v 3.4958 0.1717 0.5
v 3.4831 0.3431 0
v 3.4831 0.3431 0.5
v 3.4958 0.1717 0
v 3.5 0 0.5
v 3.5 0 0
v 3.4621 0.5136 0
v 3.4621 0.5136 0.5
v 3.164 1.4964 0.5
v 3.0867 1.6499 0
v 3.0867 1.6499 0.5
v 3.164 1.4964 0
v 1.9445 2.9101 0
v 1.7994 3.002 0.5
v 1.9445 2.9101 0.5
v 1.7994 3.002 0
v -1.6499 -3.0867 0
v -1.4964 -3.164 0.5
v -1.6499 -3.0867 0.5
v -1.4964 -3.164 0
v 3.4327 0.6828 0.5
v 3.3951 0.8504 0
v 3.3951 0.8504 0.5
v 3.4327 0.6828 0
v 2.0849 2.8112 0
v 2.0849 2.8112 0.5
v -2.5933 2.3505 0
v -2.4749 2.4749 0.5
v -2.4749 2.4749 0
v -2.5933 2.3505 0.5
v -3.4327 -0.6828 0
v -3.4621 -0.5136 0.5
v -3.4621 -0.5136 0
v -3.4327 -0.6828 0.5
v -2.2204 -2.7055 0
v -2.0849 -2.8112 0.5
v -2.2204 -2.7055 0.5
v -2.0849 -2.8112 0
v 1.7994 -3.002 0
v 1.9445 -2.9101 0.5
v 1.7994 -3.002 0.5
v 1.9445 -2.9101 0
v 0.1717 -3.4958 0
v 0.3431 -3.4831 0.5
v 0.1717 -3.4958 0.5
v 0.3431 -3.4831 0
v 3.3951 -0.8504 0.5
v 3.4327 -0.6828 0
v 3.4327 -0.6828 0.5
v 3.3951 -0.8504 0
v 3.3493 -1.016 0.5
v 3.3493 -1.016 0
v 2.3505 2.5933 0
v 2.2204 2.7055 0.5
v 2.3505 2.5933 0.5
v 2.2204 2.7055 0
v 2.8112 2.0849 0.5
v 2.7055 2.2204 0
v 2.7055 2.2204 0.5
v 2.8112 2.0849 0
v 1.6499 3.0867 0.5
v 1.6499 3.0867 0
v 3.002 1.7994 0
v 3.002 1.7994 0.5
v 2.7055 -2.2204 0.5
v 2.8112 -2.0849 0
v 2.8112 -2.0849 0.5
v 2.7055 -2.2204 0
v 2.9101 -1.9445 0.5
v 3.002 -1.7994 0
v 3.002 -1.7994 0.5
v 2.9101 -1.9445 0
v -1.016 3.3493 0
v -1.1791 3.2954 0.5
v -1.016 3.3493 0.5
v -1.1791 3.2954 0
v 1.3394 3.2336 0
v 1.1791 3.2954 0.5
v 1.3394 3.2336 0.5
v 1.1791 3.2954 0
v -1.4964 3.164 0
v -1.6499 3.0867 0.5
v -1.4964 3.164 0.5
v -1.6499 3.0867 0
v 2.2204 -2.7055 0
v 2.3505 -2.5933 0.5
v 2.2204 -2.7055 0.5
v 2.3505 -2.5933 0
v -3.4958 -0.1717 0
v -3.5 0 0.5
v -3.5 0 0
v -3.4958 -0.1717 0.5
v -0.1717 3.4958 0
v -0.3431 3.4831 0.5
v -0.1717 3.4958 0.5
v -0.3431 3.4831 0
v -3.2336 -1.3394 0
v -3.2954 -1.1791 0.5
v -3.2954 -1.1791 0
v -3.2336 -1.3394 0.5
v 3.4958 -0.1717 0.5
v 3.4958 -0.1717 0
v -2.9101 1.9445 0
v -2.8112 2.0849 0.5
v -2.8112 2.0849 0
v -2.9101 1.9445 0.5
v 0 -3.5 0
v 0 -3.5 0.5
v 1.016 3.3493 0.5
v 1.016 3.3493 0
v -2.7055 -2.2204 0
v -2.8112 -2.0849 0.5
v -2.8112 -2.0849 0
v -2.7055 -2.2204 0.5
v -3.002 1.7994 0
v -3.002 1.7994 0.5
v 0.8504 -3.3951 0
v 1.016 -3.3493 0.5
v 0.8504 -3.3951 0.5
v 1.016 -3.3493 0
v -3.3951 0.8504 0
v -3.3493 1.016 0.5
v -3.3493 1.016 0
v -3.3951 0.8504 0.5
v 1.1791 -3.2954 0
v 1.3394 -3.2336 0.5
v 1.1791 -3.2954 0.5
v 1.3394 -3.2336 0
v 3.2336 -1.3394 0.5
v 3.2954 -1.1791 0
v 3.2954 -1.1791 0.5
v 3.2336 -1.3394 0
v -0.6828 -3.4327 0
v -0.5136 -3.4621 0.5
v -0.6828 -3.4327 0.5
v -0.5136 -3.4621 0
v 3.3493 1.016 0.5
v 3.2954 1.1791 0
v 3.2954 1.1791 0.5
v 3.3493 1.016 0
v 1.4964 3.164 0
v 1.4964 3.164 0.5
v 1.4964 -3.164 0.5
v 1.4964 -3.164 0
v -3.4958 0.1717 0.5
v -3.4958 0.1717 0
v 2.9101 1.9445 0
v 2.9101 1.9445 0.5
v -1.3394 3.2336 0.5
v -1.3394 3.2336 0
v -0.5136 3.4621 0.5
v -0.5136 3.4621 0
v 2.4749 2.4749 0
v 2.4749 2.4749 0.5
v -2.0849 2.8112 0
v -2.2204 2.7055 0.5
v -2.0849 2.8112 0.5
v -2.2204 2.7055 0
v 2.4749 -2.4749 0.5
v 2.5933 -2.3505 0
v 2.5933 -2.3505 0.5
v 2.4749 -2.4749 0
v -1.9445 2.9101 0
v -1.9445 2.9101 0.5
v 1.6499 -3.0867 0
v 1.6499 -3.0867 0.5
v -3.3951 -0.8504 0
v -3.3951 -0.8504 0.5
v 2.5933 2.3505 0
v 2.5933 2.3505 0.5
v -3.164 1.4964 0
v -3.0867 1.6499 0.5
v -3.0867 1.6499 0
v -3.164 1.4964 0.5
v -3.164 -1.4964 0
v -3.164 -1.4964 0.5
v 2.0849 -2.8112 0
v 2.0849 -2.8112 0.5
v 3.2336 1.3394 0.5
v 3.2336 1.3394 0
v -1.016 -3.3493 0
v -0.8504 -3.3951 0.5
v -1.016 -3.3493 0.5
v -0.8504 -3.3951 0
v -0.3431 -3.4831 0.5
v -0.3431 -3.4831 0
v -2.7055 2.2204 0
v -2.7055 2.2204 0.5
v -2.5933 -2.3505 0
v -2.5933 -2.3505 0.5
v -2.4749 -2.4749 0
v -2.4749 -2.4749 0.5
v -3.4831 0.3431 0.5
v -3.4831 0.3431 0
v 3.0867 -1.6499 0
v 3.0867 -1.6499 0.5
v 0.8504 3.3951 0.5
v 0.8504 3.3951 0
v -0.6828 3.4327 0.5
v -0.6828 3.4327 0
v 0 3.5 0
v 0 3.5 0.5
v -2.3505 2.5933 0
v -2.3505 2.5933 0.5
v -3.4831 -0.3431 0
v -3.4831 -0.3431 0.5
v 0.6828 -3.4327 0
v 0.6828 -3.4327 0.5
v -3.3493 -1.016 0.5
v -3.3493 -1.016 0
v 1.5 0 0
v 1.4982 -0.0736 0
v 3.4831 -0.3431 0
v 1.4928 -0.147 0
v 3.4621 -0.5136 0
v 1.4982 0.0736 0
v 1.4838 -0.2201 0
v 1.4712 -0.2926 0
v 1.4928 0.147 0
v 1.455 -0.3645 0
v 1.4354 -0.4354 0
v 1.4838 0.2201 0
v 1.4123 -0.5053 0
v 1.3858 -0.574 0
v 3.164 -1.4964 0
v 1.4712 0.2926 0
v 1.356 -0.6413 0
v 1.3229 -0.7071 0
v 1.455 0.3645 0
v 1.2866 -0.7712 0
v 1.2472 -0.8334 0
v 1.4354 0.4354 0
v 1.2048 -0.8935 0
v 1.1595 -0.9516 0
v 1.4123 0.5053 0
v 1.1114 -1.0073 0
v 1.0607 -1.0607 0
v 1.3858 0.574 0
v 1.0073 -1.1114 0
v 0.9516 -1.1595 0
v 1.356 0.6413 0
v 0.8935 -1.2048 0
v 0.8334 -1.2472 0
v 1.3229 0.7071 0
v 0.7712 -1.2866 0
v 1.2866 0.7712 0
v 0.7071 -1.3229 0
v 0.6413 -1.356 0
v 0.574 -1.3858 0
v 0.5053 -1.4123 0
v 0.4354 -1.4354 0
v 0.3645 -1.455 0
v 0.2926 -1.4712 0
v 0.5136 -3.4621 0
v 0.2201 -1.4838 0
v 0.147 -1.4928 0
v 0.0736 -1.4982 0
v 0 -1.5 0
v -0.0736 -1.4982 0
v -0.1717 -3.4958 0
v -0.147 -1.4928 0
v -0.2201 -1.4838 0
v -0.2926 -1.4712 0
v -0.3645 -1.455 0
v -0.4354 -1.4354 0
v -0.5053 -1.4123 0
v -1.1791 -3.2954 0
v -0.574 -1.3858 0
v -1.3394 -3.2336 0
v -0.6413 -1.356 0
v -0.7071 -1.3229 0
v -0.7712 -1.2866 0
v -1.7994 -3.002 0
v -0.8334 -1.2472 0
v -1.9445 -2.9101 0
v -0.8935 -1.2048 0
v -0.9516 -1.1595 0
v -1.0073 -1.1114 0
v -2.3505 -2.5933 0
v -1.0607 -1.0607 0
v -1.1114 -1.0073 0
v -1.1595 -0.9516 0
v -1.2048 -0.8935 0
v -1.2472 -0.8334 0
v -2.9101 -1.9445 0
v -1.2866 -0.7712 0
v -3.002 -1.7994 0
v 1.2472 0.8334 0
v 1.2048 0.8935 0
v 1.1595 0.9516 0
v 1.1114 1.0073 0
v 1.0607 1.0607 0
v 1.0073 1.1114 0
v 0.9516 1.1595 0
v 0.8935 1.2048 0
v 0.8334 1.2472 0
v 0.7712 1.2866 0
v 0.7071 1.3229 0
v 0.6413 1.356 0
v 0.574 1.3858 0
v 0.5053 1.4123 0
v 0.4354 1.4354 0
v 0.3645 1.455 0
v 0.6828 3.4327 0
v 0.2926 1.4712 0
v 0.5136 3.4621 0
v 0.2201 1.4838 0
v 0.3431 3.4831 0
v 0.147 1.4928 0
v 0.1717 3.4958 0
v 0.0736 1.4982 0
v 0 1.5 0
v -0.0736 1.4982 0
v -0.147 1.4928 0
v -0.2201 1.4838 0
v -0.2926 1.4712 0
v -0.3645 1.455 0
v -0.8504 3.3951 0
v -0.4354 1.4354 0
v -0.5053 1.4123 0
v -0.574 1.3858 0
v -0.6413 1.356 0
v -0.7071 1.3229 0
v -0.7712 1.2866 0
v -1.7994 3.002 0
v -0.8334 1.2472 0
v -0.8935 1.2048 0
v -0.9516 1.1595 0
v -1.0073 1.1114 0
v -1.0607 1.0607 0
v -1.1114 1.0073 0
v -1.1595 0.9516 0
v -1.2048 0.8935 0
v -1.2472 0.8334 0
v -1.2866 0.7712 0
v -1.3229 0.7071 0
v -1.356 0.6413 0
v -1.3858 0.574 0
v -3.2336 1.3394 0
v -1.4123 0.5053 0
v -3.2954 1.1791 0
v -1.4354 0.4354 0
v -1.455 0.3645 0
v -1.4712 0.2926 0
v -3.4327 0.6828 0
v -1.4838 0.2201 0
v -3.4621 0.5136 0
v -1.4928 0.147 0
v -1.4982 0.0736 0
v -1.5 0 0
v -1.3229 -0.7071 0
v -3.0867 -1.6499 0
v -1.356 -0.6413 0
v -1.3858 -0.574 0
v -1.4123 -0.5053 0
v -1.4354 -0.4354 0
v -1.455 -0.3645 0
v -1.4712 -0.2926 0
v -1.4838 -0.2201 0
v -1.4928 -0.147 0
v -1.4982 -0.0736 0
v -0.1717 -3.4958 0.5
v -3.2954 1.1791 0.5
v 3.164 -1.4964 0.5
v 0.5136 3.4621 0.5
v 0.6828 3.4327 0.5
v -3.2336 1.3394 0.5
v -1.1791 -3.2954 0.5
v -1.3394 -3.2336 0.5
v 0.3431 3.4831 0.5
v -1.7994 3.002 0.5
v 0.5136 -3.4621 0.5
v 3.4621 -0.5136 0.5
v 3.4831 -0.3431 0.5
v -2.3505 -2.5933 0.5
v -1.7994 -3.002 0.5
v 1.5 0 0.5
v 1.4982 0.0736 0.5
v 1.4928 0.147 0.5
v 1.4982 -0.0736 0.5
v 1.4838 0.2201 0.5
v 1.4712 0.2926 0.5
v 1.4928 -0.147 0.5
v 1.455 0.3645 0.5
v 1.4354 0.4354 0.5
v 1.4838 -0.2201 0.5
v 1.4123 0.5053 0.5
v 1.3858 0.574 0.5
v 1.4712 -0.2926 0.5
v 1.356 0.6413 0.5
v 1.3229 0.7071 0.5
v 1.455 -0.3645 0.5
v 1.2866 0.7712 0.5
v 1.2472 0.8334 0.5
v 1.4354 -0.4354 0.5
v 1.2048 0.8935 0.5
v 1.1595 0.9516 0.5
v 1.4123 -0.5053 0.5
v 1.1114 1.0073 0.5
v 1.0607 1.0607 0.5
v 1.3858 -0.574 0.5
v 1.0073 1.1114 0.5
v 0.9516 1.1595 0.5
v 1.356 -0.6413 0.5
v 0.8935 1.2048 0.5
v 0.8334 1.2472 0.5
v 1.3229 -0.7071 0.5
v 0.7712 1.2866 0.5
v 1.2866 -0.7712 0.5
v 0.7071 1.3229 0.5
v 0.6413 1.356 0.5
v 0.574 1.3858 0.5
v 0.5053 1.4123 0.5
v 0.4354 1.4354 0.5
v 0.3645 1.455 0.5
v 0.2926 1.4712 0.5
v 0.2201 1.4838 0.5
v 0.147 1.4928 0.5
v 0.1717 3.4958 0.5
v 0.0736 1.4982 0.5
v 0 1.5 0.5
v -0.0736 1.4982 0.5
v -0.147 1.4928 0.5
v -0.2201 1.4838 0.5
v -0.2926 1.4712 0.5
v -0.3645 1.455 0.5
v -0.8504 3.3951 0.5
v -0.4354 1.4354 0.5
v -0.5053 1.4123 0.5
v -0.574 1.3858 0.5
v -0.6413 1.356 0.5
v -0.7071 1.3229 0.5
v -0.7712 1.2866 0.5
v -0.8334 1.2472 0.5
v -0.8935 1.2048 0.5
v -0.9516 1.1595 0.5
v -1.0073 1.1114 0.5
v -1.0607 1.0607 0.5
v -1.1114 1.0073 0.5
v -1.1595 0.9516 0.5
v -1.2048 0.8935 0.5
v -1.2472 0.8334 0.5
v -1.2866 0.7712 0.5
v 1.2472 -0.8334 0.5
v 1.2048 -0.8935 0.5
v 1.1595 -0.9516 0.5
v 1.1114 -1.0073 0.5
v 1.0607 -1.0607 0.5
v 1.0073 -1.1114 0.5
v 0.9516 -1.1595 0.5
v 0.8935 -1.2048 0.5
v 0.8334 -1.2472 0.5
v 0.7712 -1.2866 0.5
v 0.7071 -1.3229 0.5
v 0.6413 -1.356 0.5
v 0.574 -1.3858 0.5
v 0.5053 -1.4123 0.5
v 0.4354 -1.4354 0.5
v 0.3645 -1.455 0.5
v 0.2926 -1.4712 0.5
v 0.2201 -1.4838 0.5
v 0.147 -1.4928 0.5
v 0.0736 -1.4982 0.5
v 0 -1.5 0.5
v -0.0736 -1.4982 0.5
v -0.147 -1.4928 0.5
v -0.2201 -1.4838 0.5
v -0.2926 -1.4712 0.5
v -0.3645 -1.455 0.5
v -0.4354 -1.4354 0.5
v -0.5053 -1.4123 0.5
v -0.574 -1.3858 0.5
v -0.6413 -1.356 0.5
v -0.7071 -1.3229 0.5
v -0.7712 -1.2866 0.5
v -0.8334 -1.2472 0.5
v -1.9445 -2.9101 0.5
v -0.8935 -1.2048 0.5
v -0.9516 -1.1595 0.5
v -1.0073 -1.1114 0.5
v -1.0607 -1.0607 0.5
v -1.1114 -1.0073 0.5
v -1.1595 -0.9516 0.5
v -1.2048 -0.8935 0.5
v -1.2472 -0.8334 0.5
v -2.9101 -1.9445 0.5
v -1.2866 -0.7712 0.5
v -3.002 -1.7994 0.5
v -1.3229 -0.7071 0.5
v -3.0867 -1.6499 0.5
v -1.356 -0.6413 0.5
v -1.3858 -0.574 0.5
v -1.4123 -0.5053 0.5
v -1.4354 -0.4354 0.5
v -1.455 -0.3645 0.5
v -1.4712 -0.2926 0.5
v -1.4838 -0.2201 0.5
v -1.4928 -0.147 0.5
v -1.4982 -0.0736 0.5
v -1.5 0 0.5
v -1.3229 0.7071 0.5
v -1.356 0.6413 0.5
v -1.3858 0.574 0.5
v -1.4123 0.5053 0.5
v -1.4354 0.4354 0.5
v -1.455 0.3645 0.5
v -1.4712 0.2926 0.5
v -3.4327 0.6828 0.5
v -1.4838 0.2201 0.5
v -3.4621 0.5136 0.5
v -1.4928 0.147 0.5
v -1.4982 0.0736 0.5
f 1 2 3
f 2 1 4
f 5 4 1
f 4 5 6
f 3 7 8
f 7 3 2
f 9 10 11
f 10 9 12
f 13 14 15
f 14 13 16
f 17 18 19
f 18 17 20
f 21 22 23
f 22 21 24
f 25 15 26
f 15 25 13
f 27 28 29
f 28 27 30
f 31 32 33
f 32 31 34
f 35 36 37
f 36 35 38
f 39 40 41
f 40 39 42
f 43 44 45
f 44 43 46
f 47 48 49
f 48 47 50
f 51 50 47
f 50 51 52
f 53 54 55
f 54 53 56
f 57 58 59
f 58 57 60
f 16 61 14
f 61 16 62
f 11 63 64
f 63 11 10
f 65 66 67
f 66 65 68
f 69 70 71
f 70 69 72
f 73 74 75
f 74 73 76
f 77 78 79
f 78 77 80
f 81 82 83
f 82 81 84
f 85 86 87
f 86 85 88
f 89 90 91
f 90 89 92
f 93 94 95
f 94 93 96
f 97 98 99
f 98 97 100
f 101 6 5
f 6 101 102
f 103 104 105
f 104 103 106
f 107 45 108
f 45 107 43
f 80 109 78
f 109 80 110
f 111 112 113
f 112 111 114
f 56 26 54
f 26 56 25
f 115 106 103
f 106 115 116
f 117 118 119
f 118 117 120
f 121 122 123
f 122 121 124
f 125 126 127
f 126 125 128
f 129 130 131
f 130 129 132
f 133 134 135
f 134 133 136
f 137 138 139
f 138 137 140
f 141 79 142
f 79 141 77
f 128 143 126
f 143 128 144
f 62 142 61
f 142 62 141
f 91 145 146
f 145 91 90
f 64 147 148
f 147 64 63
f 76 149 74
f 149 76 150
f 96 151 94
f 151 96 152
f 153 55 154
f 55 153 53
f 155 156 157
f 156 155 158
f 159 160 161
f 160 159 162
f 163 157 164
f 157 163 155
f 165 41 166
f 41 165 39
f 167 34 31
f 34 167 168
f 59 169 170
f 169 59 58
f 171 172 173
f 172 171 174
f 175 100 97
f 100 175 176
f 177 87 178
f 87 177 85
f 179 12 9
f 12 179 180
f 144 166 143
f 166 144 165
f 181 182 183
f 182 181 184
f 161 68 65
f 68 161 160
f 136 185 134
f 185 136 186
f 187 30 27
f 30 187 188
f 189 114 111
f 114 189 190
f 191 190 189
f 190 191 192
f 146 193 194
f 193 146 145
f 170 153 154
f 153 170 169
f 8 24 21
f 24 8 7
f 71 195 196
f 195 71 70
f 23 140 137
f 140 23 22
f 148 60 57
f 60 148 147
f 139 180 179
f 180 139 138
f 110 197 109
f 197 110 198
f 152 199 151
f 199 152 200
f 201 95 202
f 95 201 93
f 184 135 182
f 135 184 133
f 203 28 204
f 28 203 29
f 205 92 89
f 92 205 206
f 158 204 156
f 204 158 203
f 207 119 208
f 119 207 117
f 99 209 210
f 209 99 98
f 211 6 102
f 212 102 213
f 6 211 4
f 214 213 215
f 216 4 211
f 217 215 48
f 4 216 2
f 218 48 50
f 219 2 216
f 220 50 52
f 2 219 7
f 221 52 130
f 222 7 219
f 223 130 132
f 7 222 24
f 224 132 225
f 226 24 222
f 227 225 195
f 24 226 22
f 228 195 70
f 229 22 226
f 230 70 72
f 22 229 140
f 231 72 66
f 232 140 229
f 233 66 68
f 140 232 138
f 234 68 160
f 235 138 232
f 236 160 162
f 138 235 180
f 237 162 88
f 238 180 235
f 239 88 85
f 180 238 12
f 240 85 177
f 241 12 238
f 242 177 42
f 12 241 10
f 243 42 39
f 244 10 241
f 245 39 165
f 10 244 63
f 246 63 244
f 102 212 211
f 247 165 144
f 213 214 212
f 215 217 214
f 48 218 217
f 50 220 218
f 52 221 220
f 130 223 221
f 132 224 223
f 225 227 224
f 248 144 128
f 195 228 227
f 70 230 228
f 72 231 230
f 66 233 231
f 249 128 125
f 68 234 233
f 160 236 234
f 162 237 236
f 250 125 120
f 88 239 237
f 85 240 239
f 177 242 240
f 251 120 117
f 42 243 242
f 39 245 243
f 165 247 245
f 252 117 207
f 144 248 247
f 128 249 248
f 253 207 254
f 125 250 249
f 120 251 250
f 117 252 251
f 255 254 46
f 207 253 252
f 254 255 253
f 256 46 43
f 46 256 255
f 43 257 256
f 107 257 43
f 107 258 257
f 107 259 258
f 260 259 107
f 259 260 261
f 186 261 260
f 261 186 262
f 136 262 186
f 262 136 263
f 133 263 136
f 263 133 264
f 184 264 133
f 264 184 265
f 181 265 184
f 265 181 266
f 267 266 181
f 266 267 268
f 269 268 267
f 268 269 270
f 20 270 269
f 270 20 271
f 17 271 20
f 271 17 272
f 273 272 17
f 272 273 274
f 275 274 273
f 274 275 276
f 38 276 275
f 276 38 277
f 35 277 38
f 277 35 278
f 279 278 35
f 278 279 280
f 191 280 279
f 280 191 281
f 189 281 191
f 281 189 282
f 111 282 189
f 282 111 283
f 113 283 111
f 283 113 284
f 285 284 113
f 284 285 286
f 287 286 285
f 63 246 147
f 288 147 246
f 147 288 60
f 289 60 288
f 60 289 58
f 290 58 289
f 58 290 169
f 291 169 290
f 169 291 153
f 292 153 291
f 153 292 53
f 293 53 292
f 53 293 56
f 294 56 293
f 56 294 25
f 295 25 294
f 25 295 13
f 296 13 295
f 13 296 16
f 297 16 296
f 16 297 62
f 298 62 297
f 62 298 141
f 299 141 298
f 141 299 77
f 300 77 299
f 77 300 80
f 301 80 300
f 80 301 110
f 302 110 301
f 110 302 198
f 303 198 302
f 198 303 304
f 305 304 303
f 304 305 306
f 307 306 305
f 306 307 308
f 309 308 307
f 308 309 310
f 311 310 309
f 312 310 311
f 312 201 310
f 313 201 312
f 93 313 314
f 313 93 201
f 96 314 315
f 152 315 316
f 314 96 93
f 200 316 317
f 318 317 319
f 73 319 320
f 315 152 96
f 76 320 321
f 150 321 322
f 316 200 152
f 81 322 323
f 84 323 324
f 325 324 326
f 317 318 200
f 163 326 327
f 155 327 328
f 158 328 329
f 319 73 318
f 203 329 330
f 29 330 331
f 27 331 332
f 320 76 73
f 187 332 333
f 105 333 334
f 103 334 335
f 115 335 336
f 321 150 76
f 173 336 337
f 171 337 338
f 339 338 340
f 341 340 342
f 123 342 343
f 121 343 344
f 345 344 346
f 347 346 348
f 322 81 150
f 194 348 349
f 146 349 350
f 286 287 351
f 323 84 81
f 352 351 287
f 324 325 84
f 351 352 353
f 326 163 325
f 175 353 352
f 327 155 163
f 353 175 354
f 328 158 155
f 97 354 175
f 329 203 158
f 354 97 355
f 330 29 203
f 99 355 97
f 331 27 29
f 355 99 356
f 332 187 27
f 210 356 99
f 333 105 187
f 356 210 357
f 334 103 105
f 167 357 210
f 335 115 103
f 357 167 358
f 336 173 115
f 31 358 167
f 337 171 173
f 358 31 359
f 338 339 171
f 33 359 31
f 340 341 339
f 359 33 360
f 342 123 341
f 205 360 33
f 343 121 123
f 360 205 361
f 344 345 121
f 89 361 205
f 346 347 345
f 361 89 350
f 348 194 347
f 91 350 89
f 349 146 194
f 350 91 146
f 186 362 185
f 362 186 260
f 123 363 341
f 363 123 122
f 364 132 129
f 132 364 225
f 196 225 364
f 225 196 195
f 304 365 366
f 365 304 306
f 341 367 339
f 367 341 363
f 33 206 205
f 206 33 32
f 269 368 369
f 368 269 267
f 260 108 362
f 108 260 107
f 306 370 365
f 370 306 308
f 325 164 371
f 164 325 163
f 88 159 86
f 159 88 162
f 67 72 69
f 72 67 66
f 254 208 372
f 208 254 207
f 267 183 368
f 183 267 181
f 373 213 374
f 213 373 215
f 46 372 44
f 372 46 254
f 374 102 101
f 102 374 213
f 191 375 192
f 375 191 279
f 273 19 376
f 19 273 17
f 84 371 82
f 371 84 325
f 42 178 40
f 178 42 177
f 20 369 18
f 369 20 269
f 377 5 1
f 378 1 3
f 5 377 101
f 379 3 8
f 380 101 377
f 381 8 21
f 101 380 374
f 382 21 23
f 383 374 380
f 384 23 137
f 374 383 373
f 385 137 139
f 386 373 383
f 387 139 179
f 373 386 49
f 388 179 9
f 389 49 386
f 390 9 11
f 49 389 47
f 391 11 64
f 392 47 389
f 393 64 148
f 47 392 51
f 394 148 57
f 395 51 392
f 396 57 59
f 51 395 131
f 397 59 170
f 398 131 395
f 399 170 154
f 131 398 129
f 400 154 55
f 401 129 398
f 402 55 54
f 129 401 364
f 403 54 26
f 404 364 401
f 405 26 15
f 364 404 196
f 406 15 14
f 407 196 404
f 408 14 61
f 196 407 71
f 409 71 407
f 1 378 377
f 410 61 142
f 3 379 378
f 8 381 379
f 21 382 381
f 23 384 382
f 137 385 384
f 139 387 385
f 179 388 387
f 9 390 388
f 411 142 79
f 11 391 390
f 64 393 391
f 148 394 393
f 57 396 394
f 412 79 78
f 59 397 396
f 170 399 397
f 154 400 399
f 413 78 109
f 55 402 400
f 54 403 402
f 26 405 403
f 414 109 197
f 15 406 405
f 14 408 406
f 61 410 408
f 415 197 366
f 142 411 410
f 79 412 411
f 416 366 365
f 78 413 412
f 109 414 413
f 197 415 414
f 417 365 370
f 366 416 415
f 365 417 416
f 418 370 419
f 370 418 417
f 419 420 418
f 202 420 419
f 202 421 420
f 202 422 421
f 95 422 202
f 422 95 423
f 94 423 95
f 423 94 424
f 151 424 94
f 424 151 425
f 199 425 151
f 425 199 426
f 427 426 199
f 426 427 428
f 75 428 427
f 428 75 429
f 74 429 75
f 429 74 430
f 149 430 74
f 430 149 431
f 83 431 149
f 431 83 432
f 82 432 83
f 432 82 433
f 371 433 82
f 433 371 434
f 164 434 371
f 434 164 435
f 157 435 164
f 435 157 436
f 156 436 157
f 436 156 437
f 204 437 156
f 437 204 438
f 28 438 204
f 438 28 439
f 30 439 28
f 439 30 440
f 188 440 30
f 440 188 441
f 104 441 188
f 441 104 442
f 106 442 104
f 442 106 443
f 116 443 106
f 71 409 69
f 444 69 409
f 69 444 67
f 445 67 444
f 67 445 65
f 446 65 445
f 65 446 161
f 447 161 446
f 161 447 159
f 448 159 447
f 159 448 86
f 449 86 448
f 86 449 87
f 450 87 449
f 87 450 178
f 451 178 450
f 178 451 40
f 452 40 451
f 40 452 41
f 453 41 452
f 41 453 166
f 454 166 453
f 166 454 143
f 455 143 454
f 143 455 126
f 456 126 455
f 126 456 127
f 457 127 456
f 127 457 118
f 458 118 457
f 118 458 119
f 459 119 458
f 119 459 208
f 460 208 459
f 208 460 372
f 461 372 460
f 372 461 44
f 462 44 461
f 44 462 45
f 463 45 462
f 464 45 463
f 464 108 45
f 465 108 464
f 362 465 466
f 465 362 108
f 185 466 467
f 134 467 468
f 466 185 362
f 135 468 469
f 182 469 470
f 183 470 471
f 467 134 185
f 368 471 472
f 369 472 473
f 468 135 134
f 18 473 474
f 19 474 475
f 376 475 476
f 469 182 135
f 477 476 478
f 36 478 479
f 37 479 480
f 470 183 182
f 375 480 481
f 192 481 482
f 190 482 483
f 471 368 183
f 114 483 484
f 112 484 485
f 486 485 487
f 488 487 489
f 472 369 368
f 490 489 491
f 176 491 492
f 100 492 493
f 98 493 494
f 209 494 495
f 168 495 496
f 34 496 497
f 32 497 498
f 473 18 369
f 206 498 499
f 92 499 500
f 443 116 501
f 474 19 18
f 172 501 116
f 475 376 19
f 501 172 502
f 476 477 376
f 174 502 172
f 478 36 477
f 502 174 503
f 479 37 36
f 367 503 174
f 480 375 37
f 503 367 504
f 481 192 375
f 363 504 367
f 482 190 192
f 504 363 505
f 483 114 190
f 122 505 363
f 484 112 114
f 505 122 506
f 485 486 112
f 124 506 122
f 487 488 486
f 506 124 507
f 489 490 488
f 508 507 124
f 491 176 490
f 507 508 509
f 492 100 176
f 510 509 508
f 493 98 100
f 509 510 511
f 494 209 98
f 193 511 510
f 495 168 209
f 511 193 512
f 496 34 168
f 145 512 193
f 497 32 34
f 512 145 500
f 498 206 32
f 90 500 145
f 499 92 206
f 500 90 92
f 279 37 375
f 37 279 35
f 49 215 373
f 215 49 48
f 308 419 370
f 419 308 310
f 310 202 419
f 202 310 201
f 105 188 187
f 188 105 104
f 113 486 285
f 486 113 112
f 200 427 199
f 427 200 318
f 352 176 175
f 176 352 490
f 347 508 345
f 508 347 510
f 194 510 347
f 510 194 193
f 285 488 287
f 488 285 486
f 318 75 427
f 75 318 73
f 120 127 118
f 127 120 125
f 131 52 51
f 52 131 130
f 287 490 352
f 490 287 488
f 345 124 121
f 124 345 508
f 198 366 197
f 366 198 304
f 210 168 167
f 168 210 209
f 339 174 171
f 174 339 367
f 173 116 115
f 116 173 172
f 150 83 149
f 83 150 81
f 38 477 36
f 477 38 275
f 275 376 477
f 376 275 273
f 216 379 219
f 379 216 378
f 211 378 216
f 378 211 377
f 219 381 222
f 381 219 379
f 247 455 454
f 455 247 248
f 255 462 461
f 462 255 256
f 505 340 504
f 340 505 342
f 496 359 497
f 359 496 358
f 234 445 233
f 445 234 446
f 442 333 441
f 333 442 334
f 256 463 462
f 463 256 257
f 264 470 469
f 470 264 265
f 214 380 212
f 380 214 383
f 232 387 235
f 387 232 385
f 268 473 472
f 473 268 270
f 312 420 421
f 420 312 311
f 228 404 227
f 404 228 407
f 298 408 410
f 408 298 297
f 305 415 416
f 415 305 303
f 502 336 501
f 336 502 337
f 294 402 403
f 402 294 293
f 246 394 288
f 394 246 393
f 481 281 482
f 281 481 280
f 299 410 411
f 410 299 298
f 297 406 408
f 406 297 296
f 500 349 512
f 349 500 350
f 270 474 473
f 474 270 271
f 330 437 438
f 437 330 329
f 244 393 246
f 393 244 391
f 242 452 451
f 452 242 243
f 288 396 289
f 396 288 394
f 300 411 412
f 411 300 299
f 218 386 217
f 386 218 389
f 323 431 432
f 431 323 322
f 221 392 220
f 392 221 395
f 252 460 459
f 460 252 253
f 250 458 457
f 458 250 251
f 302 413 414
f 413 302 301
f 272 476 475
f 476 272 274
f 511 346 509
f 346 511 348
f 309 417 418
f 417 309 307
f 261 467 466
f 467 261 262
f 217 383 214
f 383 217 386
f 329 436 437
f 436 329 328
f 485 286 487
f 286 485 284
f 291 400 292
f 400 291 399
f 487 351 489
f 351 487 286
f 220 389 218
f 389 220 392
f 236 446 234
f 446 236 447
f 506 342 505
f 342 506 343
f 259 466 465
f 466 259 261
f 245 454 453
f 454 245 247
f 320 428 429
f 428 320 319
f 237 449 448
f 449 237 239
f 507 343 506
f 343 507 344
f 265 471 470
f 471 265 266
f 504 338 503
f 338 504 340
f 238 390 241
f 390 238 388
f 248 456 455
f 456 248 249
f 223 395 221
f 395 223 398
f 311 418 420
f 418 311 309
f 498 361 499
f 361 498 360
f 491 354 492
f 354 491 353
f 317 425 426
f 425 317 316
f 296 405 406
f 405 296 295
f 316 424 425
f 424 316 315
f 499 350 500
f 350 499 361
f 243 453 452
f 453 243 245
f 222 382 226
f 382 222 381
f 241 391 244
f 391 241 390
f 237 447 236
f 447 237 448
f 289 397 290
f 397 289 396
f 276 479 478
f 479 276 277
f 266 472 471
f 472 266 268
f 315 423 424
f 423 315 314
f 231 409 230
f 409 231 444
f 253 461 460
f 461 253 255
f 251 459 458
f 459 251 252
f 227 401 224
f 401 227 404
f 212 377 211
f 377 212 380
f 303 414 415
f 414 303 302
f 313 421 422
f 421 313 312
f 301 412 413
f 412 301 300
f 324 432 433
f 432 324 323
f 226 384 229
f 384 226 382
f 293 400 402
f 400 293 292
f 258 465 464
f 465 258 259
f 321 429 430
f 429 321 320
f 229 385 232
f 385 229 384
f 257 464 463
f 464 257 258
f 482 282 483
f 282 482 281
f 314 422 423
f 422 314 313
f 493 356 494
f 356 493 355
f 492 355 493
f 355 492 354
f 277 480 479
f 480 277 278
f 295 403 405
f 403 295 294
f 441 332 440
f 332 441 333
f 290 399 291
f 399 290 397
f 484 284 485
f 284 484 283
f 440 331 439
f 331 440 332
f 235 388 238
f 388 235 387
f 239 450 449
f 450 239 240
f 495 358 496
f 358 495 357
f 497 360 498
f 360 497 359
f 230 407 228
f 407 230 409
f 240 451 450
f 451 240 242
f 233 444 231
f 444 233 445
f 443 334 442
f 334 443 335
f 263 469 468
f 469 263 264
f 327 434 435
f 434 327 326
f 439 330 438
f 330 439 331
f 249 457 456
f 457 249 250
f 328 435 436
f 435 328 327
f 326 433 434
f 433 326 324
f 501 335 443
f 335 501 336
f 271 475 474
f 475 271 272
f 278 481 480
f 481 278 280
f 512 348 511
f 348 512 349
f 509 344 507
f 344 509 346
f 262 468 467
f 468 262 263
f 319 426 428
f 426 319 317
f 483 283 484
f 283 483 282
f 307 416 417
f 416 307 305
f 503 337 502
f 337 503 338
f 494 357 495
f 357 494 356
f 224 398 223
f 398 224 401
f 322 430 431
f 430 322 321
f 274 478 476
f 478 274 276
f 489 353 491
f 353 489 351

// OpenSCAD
$fn = 128;

inner_d = 3.0;
outer_d = 7.0;
thickness = 0.5;

difference() {
  cylinder(h = thickness, d = outer_d);
  cylinder(h = thickness + 0.2, d = inner_d);
}
